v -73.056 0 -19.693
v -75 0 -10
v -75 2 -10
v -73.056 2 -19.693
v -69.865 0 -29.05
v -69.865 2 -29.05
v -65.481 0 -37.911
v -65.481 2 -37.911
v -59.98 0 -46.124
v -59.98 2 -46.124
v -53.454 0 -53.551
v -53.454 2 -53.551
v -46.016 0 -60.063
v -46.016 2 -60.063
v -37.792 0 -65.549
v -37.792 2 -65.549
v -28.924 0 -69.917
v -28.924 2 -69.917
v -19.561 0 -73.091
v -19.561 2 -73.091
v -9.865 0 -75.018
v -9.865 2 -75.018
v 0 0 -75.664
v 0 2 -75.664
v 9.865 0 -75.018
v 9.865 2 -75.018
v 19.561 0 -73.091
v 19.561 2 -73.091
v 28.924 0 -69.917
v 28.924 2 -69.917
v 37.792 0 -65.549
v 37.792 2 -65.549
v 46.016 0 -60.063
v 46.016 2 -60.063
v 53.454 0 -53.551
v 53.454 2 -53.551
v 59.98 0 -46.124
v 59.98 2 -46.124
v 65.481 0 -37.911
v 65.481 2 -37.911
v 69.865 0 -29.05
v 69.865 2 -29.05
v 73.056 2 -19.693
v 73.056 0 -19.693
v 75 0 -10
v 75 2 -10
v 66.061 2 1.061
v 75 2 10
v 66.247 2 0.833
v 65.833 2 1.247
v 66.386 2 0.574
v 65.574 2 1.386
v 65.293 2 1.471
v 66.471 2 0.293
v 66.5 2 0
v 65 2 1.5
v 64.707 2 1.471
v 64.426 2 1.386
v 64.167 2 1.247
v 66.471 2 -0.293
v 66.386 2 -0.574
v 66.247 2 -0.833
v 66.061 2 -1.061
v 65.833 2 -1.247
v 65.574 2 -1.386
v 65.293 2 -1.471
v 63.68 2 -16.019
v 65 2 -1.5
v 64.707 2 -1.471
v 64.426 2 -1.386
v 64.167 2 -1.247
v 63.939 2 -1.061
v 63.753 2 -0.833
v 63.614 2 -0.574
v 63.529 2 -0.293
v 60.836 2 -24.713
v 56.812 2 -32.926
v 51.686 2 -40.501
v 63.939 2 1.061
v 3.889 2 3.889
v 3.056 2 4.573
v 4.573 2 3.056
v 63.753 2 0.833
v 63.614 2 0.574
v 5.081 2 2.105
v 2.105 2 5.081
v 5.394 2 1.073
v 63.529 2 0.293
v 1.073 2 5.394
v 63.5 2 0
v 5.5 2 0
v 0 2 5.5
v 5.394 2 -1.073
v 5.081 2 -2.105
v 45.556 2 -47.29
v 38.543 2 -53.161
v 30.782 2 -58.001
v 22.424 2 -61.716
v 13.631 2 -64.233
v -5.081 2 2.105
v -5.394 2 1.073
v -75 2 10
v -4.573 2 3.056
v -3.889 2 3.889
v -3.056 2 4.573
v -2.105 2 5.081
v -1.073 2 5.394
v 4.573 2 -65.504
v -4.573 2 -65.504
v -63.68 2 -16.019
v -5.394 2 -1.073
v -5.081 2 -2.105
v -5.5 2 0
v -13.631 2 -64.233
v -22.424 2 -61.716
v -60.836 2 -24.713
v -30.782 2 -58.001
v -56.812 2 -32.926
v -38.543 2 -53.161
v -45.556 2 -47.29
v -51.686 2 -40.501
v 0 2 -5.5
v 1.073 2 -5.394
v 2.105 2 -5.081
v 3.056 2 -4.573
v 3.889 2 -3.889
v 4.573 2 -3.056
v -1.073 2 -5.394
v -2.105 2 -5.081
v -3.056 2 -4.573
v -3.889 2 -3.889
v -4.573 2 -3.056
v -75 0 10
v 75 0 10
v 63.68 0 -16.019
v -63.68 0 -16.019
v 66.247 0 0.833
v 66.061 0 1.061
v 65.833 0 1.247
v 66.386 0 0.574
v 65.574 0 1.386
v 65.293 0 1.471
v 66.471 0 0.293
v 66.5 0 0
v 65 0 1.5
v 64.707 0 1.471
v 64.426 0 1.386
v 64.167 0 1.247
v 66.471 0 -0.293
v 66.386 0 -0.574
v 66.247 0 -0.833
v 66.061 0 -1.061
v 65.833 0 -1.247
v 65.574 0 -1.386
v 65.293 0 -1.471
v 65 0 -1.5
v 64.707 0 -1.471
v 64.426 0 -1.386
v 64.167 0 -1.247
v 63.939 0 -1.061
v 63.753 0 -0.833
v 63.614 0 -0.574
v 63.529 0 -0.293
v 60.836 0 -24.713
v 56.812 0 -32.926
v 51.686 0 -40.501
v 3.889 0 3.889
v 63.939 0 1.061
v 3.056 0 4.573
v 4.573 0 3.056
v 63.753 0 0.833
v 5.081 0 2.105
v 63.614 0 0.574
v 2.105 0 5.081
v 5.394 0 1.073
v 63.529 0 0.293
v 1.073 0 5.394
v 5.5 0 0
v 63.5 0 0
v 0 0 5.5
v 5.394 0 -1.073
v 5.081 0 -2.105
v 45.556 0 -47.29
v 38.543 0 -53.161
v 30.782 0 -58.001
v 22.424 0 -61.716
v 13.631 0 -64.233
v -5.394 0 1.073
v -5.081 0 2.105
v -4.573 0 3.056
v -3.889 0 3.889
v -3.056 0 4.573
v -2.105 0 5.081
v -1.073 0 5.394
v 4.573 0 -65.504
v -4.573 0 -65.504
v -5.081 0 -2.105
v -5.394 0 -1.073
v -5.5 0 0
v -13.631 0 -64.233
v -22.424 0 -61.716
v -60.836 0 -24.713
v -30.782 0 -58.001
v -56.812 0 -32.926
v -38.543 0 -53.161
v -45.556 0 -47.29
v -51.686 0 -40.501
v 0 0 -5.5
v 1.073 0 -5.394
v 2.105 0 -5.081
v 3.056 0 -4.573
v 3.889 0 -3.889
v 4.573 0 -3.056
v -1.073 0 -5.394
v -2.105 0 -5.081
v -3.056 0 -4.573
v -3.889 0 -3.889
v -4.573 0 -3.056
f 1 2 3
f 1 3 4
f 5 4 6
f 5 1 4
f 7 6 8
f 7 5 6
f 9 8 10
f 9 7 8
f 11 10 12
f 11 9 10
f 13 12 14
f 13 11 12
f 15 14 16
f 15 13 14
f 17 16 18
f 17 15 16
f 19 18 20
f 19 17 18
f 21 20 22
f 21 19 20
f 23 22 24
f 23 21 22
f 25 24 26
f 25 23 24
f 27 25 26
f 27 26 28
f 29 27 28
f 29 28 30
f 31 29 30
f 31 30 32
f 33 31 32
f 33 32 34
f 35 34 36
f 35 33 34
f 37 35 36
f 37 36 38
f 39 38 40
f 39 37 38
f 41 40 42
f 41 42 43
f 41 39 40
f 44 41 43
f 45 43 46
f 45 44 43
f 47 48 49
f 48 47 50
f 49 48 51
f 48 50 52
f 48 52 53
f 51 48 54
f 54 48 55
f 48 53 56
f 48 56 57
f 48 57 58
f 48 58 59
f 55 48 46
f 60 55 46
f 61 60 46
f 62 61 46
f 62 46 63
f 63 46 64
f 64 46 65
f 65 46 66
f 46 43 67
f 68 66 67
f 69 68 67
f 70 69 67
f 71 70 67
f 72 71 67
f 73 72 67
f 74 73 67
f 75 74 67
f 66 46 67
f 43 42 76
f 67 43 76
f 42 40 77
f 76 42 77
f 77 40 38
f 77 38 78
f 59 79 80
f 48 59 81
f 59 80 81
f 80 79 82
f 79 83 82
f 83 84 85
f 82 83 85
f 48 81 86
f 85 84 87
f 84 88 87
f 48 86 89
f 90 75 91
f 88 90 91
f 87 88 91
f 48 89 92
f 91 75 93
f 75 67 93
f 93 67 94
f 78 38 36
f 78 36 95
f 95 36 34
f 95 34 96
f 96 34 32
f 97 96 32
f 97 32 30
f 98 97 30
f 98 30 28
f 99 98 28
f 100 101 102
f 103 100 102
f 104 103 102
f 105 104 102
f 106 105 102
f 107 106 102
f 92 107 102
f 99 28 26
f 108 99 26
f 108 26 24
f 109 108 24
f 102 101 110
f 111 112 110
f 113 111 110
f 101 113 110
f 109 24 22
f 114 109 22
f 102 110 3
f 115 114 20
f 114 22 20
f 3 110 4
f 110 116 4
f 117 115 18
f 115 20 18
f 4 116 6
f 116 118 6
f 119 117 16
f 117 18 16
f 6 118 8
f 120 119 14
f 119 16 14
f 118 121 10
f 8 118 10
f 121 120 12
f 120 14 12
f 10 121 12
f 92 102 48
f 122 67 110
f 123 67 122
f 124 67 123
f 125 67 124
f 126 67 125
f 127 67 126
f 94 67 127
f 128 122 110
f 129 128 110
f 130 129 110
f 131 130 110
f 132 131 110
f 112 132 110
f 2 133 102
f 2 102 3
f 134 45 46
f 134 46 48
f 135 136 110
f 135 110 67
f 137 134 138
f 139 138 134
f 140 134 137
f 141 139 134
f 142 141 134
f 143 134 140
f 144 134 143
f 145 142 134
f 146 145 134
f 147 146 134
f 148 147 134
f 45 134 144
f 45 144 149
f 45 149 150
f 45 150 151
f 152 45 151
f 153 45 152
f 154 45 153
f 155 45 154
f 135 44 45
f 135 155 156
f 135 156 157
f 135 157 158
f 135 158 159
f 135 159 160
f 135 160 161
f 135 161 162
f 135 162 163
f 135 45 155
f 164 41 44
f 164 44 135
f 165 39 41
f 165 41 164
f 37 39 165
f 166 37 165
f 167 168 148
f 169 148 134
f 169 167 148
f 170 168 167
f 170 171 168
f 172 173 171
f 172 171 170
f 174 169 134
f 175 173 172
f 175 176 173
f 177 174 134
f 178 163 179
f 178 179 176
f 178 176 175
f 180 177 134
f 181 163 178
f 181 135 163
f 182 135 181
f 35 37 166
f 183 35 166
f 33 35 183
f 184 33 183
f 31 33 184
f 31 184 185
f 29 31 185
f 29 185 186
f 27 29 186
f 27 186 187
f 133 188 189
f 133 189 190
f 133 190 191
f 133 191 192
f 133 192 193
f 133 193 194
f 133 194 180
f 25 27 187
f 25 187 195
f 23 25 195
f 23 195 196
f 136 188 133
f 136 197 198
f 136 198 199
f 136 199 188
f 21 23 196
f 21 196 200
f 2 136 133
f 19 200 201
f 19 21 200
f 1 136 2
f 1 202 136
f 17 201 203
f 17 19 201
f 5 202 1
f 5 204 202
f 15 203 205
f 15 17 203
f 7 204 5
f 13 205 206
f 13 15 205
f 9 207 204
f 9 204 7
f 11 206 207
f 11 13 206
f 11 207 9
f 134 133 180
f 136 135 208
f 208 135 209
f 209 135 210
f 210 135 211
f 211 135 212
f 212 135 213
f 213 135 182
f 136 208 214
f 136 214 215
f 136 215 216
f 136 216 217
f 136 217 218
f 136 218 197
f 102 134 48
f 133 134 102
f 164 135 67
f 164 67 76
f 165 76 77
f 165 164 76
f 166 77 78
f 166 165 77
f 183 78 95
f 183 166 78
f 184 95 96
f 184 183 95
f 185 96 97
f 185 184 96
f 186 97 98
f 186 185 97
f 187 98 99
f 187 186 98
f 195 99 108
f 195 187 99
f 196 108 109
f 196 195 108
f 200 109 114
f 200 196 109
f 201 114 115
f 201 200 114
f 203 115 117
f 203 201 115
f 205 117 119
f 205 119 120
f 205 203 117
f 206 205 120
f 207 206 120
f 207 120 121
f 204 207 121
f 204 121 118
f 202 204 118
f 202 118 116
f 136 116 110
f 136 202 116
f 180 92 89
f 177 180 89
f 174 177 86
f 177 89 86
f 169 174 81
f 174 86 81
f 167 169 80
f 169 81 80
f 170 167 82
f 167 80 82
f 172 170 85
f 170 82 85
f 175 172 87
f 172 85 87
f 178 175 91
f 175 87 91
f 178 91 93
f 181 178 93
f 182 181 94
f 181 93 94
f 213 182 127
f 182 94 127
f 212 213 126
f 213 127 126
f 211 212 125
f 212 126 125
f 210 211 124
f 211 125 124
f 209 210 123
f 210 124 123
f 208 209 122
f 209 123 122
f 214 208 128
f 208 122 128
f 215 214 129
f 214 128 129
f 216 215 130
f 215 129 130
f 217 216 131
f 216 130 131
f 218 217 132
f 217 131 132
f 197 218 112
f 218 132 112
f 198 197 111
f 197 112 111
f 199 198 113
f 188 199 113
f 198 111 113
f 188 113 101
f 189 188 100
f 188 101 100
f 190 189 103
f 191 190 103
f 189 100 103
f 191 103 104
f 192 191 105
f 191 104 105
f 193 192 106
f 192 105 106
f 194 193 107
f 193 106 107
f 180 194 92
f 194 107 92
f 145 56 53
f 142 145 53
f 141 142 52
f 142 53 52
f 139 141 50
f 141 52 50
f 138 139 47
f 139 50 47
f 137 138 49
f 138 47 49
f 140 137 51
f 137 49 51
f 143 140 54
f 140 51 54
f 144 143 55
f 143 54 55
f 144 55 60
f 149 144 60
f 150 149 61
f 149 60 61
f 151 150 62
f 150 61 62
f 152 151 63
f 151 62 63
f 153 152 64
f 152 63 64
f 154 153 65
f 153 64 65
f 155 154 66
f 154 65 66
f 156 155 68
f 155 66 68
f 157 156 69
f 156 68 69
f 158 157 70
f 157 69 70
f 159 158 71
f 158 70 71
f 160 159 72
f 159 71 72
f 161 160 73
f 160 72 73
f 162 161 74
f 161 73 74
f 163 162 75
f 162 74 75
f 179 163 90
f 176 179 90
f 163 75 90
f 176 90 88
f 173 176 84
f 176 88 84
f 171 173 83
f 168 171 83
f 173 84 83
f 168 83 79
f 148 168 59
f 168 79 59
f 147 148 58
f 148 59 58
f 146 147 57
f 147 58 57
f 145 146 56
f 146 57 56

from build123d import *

# Parameters (mm, degrees)
BOSS_EXTRUDE1_DEPTH = 2
SKETCH2_R           = 5.5
SKETCH2_R_2         = 1.5
CUT_EXTRUDE1_DEPTH  = 2


with BuildPart() as part:
    # Sketch1 → Boss-Extrude1 (new body)
    with BuildSketch(Plane(origin=(0, 0, 0), x_dir=(1, 0, 0), z_dir=(0, 1, 0))):
        with BuildLine():
            Line((75, -10), (-75, -10))
            Line((-75, -10), (-75, 10))
            ThreePointArc((-75, 10), (0, 75.663729752), (75, 10))
            Line((75, 10), (75, -10))
        make_face()
        with BuildLine():
            Line((-63.679706635, 16.019374764), (63.679706635, 16.019374764))
            ThreePointArc((63.679706635, 16.019374764), (0, 65.663729752), (-63.679706635, 16.019374764))
        make_face(mode=Mode.SUBTRACT)
    extrude(amount=BOSS_EXTRUDE1_DEPTH)

    # Sketch2 → Cut-Extrude1 (cut)
    with BuildSketch(Plane(origin=(0, 2, 0), x_dir=(1, 0, 0), z_dir=(0, 1, 0))):
        with Locations(Location((0, 0, 0), (0, 0, 270))):
            Circle(SKETCH2_R)
        with Locations(Location((65, 0, 0), (0, 0, 270))):
            Circle(SKETCH2_R_2)
    extrude(amount=-CUT_EXTRUDE1_DEPTH, mode=Mode.SUBTRACT)


solid = part.part
